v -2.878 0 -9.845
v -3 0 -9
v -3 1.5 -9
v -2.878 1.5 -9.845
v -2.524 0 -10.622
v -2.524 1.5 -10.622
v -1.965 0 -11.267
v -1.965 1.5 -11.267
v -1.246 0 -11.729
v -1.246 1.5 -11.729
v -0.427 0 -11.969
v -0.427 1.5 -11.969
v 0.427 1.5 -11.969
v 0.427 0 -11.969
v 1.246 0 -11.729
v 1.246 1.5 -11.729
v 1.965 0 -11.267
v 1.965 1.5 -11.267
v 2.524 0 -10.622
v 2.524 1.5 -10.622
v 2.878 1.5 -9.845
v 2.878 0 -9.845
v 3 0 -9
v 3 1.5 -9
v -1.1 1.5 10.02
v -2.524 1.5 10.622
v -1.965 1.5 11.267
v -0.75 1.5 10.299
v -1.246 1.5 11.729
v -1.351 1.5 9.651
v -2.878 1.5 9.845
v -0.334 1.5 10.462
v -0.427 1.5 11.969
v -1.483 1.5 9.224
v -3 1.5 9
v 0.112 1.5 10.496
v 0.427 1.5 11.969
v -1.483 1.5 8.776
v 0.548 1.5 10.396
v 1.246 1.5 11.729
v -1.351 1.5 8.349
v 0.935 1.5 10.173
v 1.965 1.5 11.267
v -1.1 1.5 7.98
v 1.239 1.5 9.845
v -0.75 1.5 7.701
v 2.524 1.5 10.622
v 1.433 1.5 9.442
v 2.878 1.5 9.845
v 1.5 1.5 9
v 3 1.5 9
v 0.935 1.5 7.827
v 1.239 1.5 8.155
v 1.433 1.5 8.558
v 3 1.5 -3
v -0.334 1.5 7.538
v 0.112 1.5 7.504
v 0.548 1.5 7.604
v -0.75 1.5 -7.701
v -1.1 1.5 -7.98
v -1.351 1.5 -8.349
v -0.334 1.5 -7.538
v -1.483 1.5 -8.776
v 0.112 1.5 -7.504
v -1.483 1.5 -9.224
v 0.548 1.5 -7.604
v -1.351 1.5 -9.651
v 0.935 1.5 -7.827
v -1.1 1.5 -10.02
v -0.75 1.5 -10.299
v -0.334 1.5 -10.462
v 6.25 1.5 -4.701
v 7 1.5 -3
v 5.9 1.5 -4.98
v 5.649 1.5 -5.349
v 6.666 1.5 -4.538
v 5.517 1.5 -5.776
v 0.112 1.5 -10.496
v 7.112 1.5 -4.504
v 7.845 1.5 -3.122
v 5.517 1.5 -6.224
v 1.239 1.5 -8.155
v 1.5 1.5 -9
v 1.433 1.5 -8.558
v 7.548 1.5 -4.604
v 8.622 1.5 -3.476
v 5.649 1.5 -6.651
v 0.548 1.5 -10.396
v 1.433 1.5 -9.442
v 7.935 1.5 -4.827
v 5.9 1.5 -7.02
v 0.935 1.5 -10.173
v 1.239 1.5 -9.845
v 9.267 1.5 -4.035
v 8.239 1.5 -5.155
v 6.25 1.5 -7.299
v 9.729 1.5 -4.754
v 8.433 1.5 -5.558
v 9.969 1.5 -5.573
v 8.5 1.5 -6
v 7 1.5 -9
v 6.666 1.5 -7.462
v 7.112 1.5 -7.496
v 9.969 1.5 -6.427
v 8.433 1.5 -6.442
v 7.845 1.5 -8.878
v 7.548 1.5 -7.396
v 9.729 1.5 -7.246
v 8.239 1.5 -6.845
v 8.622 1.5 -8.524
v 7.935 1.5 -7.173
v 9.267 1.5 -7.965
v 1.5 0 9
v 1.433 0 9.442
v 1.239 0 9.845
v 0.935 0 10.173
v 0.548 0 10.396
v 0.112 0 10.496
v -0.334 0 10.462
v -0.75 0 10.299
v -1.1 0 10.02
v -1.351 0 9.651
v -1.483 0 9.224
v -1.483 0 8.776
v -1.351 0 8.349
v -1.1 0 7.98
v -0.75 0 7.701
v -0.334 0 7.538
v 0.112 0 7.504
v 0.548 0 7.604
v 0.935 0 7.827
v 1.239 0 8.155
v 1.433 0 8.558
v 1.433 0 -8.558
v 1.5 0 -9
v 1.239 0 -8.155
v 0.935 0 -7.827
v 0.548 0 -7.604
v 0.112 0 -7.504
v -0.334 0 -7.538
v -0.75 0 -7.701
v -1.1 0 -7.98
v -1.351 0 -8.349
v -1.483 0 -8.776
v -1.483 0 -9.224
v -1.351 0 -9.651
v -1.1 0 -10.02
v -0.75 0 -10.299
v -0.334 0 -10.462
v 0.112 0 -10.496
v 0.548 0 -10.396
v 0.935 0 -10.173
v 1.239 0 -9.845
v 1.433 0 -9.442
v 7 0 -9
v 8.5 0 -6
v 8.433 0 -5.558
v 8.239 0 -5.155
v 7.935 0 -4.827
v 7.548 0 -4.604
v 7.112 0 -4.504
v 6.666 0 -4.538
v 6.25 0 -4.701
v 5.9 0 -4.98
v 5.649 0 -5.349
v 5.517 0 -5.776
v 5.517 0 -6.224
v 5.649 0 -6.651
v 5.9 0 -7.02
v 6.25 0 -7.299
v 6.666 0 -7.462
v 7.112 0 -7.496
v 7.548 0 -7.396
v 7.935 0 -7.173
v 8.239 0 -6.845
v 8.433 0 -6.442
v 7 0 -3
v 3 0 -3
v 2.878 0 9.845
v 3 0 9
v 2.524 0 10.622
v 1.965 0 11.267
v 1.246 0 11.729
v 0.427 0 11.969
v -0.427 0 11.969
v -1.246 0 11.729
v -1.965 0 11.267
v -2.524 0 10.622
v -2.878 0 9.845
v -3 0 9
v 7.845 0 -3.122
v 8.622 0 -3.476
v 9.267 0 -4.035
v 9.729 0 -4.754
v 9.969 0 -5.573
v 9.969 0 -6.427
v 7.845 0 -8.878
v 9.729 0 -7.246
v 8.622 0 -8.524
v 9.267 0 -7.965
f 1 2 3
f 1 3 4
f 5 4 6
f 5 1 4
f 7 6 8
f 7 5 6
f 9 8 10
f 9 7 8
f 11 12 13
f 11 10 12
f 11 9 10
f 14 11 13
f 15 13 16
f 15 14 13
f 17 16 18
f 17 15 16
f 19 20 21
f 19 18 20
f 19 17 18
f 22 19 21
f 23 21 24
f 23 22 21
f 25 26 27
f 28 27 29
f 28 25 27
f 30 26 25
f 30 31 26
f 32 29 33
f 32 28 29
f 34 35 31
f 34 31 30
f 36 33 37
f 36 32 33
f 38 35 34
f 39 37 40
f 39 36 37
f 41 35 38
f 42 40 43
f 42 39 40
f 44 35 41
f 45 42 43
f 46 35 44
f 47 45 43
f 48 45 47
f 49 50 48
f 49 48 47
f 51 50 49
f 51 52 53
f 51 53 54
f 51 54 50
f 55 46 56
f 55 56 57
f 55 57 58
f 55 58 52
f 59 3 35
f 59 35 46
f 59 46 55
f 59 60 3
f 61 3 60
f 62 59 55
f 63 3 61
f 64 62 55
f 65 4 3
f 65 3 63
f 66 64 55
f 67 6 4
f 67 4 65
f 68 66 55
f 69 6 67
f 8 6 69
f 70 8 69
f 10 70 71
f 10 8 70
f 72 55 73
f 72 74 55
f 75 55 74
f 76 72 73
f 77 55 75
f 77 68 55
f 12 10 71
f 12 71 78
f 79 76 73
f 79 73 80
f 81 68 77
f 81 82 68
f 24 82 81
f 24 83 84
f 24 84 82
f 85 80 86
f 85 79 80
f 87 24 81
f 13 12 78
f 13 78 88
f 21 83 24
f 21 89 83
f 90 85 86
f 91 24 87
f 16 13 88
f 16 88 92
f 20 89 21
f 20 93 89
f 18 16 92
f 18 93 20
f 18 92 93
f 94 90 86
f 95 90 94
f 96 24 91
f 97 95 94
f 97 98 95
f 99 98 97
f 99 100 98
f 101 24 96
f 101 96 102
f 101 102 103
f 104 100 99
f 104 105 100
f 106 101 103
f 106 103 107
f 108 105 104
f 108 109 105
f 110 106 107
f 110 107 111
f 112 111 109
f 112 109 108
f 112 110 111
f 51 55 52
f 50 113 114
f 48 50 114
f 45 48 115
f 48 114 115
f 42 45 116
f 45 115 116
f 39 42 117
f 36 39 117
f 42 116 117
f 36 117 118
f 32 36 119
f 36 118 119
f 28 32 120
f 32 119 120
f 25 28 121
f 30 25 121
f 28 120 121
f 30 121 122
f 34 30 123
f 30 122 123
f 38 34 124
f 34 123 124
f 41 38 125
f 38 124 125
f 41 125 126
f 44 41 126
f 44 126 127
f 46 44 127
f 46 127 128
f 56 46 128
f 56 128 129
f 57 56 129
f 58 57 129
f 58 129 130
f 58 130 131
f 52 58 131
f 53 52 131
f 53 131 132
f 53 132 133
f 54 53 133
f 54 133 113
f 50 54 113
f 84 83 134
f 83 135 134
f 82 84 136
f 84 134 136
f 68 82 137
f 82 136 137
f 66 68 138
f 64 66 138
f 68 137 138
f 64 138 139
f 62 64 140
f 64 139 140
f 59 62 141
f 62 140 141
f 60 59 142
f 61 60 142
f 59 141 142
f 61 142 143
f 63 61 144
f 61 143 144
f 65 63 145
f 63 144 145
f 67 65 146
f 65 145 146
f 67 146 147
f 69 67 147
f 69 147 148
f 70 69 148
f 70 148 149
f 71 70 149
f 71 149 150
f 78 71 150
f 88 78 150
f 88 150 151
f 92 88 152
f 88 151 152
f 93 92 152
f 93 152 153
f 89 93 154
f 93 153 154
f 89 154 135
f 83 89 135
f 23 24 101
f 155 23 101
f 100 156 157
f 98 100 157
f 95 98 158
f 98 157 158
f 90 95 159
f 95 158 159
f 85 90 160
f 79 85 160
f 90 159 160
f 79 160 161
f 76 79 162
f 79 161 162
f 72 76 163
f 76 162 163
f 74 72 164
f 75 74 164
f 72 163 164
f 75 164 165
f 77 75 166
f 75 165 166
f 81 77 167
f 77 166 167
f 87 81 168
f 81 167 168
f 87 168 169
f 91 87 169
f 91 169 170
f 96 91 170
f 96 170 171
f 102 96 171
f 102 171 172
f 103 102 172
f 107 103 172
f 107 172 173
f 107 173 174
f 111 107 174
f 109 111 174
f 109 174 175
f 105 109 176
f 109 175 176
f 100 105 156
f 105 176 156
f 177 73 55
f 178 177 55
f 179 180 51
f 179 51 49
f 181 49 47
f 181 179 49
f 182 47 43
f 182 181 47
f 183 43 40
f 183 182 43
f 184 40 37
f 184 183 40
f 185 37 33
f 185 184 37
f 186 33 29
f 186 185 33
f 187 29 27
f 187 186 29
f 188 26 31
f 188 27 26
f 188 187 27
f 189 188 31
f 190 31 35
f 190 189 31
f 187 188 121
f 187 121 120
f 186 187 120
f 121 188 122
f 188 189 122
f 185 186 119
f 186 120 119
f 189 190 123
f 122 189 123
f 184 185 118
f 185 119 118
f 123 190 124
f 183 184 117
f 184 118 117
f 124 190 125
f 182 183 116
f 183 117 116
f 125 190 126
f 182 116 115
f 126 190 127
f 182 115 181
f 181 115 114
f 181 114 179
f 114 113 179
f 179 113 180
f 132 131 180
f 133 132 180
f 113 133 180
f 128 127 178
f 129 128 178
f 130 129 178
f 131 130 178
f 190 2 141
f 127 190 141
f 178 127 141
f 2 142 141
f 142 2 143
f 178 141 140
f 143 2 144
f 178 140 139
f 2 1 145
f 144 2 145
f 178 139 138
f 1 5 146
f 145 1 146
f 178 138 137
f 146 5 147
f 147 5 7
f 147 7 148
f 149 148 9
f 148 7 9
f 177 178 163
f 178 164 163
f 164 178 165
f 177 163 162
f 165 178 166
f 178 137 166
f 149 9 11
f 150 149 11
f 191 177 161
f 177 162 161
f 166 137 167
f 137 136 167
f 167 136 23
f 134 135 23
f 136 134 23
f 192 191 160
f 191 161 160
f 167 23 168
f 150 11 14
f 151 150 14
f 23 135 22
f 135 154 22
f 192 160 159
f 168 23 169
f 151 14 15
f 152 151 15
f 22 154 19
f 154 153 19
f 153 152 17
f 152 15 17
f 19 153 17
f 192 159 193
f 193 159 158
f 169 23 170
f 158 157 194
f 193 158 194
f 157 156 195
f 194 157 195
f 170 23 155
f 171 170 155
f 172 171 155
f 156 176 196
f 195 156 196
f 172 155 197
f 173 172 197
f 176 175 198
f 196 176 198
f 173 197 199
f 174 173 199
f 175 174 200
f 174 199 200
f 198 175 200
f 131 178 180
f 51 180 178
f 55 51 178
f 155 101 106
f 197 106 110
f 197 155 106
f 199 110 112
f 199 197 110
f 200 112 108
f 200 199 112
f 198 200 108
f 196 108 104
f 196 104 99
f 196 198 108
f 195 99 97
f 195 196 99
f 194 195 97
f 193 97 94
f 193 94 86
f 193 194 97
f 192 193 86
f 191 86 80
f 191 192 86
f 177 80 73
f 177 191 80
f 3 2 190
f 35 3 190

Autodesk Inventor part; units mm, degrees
ref_plane "YZ Plane" through (0, 0, 0) normal (1, 0, 0) x (0, 1, 0)
ref_plane "XZ Plane" through (0, 0, 0) normal (0, 1, 0) x (-1, 0, 0)
ref_plane "XY Plane" through (0, 0, 0) normal (0, 0, 1) x (1, 0, 0)
sketch "Sketch1" plane through (0, 0, 0) normal (0, 1, 0) x (-1, 0, 0)
  line L0 (3, 9) -> (-3, 9)
  line L1 (-3, 9) -> (-3, -9)
  line L2 (-3, -9) -> (3, -9)
  line L3 (3, -9) -> (3, 9)
  line L4 (3, 9) -> (-3, -9) construction
  line L5 (-3, 9) -> (3, -9) construction
  circle A0 centre (0, 9) radius 3
  circle A1 centre (0, -9) radius 3
  line L6 (-3, -9) -> (-7, -9)
  line L7 (-7, -9) -> (-7, -5)
  line L8 (-7, -5) -> (-7, -3)
  line L9 (-7, -3) -> (-3, -3)
  line L10 (-7, -3) -> (-7, -6)
  circle A2 centre (-7, -6) radius 3
  line L11 (-3, -3) -> (-3, -9)
  point P0 (0, 0)
  dimension "d0" = 6
  dimension "d1" = 18
  dimension "d2" = 6
  dimension "d4" = 6
  dimension "d5" = 4
  dimension "d6" = 4
  dimension "d7" = 2
  dimension "d10" = 3
  dimension "d11" = 6
extrude "Extrusion1" add sketch "Sketch1" along normal blind 1.5 contours A0 L0 | L0 A0 | L3 A1 L1 A0 | A1 L2 | L2 A1 | A2 L7 L8 | L8 L7 A2
sketch "Sketch2" plane through (0, 1.5, 0) normal (0, 1, 0) x (1, 0, 0)
  line L0 (3, -9) -> (3, 9) projected
  arc A0 (3, 9) -> (-3, 9) centre (0, 9) ccw projected
  line L1 (-3, 9) -> (-3, -9) projected
  arc A1 (-3, -9) -> (3, -9) centre (0, -9) ccw projected
  circle A2 centre (0, 9) radius 1.5
  circle A3 centre (0, -9) radius 1.5
  line L2 (3, 9) -> (7, 9)
  line L3 (7, 9) -> (7, 3)
  line L4 (7, 3) -> (3, 3)
  line L5 (3, 3) -> (3, 9)
  point P0 (0, 0)
  dimension "d14" = 3
  dimension "d15" = 3
  dimension "d16" = 4
  dimension "d17" = 6
extrude "Extrusion2" cut sketch "Sketch2" against normal blind 1.5 contours L0 L2 L3 L4 | A2 | A3
sketch "Sketch3" plane through (0, 1.5, 0) normal (0, 1, 0) x (1, 0, 0)
  line L0 (3, -9) -> (3, 9) projected
  arc A0 (3, 9) -> (-3, 9) centre (0, 9) ccw projected
  line L1 (-3, 9) -> (-3, -9) projected
  line L2 (3, 9) -> (7, 9)
  line L3 (7, 9) -> (7, 3)
  line L4 (7, 3) -> (3, 3)
  line L5 (3, 3) -> (3, 9)
  point P0 (0, 0)
  dimension "d20" = 4
  dimension "d21" = 6
  dimension "d22" = 4
extrude "Extrusion3" add sketch "Sketch3" against normal blind 1.5
sketch "Sketch4" plane through (0, 1.5, 0) normal (0, 1, 0) x (1, 0, 0)
  arc A0 (7, 3) -> (7, 9) centre (7, 6) ccw projected
  circle A1 centre (7, 6) radius 1.5
  point P0 (0, 0)
  dimension "d25" = 3
extrude "Extrusion4" cut sketch "Sketch4" against normal blind 1.5
sketch "Sketch5" plane through (0, 0, 0) normal (0, -1, 0) x (1, 0, 0)
  circle A0 centre (7, -6) radius 1.5 projected
  circle A1 centre (0, 9) radius 1.5 projected
  circle A2 centre (0, -9) radius 1.5 projected
  arc A3 (7, -9) -> (7, -3) centre (7, -6) ccw projected
  arc A4 (3, 9) -> (-3, 9) centre (0, 9) ccw projected
  arc A5 (-3, -9) -> (3, -9) centre (0, -9) ccw projected
  circle A6 centre (0, 9) radius 0.1
  circle A7 centre (0, -9) radius 0.1
  circle A8 centre (7, -6) radius 0.1
  point P0 (0, 0)
  dimension "d28" = 0.2
  dimension "d29" = 0.2
  dimension "d30" = 0.2
extrude "Extrusion5" add sketch "Sketch5" against normal blind 1.5
sketch "Sketch6" plane through (0, 0, 0) normal (0, -1, 0) x (1, 0, 0)
  circle A0 centre (0, -9) radius 0.1 projected
  circle A1 centre (7, -6) radius 0.1 projected
  circle A2 centre (0, 9) radius 0.1 projected
  arc A3 (7, -9) -> (7, -3) centre (7, -6) ccw projected
  arc A4 (3, 9) -> (-3, 9) centre (0, 9) ccw projected
  arc A5 (-3, -9) -> (3, -9) centre (0, -9) ccw projected
  circle A6 centre (0, 9) radius 1.5
  circle A7 centre (0, -9) radius 1.5
  circle A8 centre (7, -6) radius 1.5
  point P0 (0, 0)
  dimension "d33" = 3
  dimension "d34" = 3
  dimension "d35" = 3
extrude "Extrusion6" cut sketch "Sketch6" against normal blind 2
sketch "Sketch7" plane through (0, 0, 0) normal (0, -1, 0) x (1, 0, 0)
  arc A0 (-3, -9) -> (3, -9) centre (0, -9) ccw projected
  line L0 (3, -9) -> (7, -9) projected
  line L1 (0, -9) -> (0, -5)
  circle A1 centre (0, -5) radius 1.5
  point P0 (0, 0)
  dimension "d38" = 4
  dimension "d39" = 3
extrude "Extrusion7" cut sketch "Sketch7" against normal blind 2
sketch "Sketch8" plane through (0, 0, 0) normal (0, -1, 0) x (1, 0, 0)
  circle A0 centre (0, -5) radius 1.5 projected
  point P0 (0, 0)
extrude "Extrusion8" add sketch "Sketch8" against normal blind 2
sketch "Sketch9" plane through (0, 2, -5) normal (0, 1, 0) x (1, 0, 0)
  circle A0 centre (0, 0) radius 1.5 projected
  point P0 (0, -5)
extrude "Extrusion9" cut sketch "Sketch9" against normal blind 0.5
properties part number "tahlo3"
